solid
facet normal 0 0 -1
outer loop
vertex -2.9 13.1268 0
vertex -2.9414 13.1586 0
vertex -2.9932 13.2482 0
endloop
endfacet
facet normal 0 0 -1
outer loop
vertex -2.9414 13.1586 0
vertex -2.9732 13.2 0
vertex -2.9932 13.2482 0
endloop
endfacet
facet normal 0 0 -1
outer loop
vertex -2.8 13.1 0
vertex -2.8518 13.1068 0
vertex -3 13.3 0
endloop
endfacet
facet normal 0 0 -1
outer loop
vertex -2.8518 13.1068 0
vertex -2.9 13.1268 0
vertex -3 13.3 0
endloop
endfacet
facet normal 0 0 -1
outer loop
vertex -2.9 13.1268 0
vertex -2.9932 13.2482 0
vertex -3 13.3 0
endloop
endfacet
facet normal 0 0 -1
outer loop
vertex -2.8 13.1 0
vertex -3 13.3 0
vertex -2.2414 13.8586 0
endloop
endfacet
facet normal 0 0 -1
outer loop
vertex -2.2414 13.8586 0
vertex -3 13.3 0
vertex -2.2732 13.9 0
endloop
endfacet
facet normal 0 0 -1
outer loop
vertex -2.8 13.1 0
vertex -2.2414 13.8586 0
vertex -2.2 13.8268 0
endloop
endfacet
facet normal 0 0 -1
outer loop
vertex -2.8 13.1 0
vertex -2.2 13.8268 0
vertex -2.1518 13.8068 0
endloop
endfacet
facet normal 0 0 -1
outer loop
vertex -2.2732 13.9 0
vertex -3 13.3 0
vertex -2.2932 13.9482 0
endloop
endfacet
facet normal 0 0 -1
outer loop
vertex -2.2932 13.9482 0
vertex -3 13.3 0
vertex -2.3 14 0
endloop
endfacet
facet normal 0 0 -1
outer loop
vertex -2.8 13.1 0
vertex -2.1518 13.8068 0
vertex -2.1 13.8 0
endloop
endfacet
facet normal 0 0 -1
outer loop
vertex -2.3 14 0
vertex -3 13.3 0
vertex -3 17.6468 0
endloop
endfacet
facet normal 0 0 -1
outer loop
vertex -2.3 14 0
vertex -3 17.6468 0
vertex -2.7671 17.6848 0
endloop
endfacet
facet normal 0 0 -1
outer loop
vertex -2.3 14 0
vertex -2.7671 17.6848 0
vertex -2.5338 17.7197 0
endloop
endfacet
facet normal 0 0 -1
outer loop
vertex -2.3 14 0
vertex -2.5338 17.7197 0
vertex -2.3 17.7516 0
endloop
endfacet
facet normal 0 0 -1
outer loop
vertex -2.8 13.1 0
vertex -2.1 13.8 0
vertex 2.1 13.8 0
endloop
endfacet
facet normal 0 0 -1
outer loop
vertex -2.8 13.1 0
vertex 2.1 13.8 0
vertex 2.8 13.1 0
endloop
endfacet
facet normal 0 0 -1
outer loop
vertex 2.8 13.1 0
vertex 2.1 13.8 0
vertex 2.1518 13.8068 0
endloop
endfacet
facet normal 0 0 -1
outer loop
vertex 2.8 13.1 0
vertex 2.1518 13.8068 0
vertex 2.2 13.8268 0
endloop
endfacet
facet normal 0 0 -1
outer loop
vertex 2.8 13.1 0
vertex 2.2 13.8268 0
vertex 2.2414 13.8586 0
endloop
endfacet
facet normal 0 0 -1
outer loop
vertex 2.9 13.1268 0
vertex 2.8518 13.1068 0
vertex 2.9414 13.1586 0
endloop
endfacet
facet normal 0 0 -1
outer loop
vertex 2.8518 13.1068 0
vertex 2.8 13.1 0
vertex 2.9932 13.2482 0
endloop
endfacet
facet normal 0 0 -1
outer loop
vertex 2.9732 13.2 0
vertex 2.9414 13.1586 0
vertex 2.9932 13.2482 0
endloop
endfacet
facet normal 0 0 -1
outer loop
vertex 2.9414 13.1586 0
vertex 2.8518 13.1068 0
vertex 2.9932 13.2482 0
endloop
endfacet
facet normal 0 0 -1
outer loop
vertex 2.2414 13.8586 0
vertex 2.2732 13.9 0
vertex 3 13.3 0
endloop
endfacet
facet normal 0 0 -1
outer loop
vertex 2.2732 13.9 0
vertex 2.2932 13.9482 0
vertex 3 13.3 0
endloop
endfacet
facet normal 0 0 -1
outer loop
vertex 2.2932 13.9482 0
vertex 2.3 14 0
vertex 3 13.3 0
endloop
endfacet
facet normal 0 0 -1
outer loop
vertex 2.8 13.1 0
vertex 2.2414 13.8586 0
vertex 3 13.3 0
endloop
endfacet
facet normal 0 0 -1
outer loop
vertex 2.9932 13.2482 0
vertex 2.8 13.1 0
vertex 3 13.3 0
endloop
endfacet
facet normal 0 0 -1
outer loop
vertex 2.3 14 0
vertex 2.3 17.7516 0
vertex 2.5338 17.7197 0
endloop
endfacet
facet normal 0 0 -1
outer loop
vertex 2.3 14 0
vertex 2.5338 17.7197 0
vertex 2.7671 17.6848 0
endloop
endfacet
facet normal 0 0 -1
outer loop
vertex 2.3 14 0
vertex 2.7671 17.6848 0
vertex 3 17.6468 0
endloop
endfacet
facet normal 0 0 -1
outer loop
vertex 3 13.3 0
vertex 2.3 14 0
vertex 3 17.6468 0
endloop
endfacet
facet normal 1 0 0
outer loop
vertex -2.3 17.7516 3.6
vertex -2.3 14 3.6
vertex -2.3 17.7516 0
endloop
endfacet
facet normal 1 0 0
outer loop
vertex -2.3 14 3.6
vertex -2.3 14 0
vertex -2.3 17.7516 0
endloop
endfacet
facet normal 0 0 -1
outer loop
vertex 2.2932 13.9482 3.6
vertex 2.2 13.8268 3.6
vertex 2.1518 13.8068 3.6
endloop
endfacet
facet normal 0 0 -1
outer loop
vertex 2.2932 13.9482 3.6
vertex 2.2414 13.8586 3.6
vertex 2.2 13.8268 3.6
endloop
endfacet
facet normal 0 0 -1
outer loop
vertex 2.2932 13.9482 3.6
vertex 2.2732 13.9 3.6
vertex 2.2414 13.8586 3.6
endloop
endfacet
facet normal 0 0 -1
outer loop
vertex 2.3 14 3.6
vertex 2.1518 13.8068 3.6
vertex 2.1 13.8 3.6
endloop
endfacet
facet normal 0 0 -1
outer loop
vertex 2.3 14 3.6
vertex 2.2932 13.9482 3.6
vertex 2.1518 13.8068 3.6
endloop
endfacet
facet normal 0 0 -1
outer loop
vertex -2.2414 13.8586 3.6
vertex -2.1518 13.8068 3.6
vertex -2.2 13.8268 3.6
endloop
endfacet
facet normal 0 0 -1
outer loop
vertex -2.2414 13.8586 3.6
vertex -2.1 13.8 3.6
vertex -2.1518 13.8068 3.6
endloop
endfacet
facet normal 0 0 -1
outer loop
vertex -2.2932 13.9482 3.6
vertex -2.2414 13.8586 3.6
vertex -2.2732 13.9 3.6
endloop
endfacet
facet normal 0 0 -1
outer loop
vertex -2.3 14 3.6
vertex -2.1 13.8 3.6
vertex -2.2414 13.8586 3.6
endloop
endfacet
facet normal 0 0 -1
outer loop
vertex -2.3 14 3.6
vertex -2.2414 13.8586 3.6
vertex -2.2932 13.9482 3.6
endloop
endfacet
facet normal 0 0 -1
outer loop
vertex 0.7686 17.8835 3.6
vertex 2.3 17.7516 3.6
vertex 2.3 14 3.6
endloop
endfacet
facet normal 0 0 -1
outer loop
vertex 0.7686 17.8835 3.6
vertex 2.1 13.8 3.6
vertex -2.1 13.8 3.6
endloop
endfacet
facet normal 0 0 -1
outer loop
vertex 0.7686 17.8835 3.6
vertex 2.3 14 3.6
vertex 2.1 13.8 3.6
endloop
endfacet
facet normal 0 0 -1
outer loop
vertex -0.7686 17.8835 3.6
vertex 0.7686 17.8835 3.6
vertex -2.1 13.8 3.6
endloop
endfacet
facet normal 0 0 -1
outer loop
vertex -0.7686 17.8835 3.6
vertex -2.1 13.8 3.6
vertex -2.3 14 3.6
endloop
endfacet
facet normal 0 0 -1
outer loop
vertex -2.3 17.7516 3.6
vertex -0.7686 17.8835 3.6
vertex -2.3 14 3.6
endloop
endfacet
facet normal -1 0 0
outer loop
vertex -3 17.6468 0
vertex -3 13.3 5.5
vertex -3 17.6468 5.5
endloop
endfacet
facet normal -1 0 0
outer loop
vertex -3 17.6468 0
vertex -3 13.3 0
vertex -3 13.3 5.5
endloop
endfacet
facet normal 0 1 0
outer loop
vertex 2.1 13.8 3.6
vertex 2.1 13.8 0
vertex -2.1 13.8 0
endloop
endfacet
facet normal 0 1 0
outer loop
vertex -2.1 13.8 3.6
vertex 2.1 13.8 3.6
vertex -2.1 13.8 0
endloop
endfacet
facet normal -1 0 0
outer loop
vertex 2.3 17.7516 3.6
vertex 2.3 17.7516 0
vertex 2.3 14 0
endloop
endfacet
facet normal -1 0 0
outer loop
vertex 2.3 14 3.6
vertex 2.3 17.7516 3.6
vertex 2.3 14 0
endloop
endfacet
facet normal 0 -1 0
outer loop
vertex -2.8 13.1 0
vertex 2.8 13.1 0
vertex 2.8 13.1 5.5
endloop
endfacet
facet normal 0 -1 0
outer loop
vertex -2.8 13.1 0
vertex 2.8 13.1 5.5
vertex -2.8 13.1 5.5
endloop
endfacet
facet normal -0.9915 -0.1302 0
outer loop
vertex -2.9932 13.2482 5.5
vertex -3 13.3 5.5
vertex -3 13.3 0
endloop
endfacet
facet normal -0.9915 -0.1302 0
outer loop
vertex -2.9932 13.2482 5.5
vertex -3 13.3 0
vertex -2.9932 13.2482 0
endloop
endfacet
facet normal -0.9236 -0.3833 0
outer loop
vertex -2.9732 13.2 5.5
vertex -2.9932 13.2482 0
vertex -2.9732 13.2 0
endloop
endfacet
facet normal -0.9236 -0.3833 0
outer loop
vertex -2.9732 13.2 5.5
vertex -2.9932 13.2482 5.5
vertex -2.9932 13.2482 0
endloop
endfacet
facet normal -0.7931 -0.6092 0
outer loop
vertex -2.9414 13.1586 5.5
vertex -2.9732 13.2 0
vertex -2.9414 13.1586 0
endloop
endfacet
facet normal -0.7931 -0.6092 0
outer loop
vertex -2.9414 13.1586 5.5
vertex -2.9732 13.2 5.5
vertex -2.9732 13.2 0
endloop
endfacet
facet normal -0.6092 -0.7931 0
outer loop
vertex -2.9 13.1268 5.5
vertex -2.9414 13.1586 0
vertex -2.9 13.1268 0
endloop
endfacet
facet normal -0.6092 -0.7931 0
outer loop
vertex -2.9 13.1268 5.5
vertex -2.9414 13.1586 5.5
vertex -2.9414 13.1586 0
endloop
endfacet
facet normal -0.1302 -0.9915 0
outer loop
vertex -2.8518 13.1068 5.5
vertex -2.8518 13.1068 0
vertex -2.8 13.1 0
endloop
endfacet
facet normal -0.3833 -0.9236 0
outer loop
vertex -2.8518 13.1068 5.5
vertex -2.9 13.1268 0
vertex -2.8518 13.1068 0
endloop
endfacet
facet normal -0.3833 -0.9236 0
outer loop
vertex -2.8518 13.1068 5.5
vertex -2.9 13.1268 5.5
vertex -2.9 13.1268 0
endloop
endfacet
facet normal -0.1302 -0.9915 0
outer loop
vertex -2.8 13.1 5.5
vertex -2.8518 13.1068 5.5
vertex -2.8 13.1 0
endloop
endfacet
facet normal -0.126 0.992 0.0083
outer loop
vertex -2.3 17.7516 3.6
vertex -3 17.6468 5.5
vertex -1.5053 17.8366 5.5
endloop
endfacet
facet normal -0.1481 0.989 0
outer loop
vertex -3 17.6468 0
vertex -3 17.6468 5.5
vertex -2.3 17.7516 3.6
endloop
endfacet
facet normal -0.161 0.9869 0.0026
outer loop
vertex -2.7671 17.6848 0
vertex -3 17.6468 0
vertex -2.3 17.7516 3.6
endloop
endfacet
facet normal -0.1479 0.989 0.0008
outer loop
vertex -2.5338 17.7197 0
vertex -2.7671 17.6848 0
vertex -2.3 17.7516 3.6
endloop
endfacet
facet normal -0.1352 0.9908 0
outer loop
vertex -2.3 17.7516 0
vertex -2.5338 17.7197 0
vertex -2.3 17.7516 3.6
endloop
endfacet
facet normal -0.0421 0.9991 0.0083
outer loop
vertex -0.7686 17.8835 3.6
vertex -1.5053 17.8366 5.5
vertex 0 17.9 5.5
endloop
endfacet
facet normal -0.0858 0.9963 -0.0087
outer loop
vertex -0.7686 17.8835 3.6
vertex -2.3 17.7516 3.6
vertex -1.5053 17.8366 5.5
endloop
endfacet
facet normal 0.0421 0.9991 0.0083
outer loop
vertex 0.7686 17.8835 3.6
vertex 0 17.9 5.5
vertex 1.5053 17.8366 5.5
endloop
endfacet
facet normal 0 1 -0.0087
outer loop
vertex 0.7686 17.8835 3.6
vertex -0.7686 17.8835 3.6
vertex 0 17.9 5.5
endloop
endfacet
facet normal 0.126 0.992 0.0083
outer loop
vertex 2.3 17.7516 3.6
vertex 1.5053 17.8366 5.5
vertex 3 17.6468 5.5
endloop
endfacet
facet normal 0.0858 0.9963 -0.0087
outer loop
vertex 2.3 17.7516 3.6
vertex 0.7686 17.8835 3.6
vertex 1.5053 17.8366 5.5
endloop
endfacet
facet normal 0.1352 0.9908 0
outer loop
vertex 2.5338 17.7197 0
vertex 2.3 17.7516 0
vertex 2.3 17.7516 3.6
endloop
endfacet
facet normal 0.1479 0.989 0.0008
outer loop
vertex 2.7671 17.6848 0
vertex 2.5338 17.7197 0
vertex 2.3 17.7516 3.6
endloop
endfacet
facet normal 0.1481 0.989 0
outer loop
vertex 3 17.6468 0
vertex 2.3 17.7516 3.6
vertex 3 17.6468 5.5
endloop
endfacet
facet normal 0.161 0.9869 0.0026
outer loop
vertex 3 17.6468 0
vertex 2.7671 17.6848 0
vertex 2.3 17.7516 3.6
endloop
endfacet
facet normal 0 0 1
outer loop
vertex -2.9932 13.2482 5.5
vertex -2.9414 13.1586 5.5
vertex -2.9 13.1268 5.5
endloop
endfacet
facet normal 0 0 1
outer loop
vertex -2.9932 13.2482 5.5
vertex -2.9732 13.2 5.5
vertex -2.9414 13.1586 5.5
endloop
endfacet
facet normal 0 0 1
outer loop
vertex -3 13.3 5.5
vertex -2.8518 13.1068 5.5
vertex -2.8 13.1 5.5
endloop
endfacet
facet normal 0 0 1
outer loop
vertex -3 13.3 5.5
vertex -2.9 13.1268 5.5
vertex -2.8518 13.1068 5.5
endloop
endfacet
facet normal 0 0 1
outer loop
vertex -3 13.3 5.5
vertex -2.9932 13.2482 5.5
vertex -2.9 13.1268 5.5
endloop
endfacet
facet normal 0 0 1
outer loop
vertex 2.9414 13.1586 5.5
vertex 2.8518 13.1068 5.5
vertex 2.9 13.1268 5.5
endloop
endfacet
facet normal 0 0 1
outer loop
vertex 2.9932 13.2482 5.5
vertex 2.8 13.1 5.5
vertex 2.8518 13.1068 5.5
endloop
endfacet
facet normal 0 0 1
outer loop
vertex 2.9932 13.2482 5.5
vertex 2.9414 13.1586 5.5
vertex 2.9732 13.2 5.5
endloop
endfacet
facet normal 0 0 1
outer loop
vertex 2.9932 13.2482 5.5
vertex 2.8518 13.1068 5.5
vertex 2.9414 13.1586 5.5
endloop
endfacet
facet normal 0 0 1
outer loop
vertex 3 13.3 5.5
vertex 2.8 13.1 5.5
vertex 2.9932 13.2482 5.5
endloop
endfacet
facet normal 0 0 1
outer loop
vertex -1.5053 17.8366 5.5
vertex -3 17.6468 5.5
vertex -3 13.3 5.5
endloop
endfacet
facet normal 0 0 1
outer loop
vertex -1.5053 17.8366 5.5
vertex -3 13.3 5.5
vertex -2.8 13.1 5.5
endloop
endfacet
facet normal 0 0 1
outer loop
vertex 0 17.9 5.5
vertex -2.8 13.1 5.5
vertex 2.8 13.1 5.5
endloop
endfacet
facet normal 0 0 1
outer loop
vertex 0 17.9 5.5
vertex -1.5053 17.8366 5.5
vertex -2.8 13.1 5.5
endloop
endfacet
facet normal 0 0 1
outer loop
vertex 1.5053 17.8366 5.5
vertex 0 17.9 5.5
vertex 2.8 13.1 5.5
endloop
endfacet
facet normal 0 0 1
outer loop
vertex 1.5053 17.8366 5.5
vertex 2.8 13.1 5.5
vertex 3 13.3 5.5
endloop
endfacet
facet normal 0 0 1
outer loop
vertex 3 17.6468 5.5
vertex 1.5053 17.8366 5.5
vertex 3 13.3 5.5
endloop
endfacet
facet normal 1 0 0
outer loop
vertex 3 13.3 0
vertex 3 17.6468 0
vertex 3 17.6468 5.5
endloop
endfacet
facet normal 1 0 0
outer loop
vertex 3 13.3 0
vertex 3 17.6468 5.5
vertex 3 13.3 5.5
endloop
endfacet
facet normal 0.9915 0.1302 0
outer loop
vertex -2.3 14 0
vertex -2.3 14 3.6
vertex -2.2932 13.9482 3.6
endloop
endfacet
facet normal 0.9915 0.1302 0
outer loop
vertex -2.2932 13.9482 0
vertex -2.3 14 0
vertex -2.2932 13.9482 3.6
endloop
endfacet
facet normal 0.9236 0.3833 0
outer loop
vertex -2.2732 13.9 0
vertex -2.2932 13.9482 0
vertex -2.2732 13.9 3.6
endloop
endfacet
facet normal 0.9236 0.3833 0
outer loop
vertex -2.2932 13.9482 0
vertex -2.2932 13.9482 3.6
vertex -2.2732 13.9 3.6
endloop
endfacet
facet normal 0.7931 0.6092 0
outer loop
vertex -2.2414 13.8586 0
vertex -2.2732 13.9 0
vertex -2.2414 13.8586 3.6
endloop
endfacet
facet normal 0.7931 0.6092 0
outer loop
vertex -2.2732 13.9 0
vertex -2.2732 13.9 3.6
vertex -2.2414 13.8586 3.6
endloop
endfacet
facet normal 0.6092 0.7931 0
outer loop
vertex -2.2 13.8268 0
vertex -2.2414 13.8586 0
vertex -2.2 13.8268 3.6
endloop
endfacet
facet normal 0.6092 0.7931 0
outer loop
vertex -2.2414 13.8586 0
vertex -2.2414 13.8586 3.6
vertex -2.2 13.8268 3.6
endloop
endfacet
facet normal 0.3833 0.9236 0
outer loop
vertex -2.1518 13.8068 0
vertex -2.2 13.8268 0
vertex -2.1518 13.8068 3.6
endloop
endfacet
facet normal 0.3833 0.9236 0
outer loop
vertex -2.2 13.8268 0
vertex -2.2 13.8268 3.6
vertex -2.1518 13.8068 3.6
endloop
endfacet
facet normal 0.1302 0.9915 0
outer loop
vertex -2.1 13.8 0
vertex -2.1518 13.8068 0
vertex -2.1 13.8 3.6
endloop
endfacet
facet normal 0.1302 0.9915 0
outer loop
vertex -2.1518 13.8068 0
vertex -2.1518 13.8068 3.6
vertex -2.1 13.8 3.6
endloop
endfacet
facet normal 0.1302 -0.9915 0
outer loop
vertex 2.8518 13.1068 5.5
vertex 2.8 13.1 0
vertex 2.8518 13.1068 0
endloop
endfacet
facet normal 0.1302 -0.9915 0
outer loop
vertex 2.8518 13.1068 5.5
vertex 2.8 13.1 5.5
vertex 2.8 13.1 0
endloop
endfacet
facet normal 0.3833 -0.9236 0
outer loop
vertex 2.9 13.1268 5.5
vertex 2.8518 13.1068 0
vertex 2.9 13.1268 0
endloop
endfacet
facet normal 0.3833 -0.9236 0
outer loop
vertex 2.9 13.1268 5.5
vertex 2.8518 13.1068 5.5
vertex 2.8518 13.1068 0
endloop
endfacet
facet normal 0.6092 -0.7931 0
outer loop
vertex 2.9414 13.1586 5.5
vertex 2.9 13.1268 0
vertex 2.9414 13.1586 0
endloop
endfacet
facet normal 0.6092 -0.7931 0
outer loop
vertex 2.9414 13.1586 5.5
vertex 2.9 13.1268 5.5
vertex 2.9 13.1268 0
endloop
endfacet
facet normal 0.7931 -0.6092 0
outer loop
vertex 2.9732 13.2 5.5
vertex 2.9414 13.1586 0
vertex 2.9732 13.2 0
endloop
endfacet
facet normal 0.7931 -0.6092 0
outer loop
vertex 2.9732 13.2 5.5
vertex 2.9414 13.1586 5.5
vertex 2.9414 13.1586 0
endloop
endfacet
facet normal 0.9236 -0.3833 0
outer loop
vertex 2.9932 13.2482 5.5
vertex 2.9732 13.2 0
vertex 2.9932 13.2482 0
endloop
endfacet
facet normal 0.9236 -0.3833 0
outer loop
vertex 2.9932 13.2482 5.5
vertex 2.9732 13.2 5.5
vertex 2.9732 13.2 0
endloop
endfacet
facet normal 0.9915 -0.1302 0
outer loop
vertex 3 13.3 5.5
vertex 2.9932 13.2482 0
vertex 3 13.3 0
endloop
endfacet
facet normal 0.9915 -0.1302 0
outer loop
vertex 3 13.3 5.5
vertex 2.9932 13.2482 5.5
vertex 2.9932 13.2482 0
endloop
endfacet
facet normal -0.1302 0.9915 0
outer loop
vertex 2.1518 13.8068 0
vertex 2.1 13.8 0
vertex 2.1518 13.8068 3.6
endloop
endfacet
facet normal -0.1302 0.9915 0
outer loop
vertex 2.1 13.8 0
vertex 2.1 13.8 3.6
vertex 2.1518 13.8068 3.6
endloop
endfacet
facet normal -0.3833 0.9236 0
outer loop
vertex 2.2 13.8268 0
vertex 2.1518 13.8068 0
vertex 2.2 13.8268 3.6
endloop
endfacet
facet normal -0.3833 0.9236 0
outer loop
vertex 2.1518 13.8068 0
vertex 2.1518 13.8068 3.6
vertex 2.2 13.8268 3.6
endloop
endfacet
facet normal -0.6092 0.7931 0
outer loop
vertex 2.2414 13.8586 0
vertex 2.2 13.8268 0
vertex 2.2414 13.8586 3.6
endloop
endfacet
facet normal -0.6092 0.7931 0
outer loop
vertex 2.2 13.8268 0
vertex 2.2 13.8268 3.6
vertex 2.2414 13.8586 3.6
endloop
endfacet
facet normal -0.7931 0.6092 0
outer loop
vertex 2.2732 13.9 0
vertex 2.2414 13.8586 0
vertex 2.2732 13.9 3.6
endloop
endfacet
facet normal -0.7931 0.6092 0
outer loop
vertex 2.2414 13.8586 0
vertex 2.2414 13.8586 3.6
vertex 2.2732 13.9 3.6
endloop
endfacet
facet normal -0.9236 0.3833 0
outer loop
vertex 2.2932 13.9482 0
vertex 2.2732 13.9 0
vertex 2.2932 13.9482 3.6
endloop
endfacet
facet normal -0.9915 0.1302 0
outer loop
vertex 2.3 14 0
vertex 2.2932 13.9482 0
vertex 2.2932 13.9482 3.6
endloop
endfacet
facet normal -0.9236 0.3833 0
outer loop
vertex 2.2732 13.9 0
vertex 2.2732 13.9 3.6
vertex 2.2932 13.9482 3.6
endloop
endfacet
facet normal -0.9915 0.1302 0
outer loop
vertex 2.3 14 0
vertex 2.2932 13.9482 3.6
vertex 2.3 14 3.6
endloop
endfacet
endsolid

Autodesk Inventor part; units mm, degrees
ref_plane "YZ Plane" through (0, 0, 0) normal (1, 0, 0) x (0, 1, 0)
ref_plane "XZ Plane" through (0, 0, 0) normal (0, 1, 0) x (-1, 0, 0)
ref_plane "XY Plane" through (0, 0, 0) normal (0, 0, 1) x (1, 0, 0)
sketch "スケッチ1" plane through (0, 0, 0) normal (0, 0, 1) x (1, 0, 0)
  line L0 (3, 13.1) -> (-3, 13.1)
  line L1 (-3, 13.1) -> (-3, 17.9)
  line L2 (-3, 17.9) -> (3, 17.9)
  line L3 (3, 17.9) -> (3, 13.1)
  arc A0 (3, 17.6468) -> (-3, 17.6468) centre (0, 0) ccw
  point P0 (0, 13.1)
  dimension "d0" = 17.9
  dimension "d1" = 6
  dimension "d2" = 4.8
extrude "押し出し1" add sketch "スケッチ1" along normal blind 5.5 contours L0 L1 A0 L3
sketch "スケッチ2" plane through (0, 0, 0) normal (0, 0, -1) x (-1, 0, 0)
  line L0 (-2.3, 13.8) -> (2.3, 13.8)
  line L1 (2.3, 13.8) -> (2.3, 17.9)
  line L2 (2.3, 17.9) -> (-2.3, 17.9)
  line L3 (-2.3, 17.9) -> (-2.3, 13.8)
  line L4 (3, 13.1) -> (-3, 13.1) projected
  line L5 (3, 17.6468) -> (3, 13.1) projected
  arc A0 (3, 17.6468) -> (-3, 17.6468) centre (0, 0) ccw projected
  point P0 (0, 13.8)
  point P1 (0, 13.1)
  point P2 (2.3, 17.7516)
  point P3 (-2.3, 17.7516)
  dimension "d5" = 0.7
  dimension "d6" = 0.7
extrude "押し出し2" cut sketch "スケッチ2" against normal blind 3.6 contours L3 A0 L1 L0
fillet "フィレット1" radius 0.2 4 edges at (3, 13.1, 2.75) (2.3, 13.8, 1.8) (-2.3, 13.8, 1.8) (-3, 13.1, 2.75)
properties part number "555_CapAccessory" material "アセタール樹脂、白"
